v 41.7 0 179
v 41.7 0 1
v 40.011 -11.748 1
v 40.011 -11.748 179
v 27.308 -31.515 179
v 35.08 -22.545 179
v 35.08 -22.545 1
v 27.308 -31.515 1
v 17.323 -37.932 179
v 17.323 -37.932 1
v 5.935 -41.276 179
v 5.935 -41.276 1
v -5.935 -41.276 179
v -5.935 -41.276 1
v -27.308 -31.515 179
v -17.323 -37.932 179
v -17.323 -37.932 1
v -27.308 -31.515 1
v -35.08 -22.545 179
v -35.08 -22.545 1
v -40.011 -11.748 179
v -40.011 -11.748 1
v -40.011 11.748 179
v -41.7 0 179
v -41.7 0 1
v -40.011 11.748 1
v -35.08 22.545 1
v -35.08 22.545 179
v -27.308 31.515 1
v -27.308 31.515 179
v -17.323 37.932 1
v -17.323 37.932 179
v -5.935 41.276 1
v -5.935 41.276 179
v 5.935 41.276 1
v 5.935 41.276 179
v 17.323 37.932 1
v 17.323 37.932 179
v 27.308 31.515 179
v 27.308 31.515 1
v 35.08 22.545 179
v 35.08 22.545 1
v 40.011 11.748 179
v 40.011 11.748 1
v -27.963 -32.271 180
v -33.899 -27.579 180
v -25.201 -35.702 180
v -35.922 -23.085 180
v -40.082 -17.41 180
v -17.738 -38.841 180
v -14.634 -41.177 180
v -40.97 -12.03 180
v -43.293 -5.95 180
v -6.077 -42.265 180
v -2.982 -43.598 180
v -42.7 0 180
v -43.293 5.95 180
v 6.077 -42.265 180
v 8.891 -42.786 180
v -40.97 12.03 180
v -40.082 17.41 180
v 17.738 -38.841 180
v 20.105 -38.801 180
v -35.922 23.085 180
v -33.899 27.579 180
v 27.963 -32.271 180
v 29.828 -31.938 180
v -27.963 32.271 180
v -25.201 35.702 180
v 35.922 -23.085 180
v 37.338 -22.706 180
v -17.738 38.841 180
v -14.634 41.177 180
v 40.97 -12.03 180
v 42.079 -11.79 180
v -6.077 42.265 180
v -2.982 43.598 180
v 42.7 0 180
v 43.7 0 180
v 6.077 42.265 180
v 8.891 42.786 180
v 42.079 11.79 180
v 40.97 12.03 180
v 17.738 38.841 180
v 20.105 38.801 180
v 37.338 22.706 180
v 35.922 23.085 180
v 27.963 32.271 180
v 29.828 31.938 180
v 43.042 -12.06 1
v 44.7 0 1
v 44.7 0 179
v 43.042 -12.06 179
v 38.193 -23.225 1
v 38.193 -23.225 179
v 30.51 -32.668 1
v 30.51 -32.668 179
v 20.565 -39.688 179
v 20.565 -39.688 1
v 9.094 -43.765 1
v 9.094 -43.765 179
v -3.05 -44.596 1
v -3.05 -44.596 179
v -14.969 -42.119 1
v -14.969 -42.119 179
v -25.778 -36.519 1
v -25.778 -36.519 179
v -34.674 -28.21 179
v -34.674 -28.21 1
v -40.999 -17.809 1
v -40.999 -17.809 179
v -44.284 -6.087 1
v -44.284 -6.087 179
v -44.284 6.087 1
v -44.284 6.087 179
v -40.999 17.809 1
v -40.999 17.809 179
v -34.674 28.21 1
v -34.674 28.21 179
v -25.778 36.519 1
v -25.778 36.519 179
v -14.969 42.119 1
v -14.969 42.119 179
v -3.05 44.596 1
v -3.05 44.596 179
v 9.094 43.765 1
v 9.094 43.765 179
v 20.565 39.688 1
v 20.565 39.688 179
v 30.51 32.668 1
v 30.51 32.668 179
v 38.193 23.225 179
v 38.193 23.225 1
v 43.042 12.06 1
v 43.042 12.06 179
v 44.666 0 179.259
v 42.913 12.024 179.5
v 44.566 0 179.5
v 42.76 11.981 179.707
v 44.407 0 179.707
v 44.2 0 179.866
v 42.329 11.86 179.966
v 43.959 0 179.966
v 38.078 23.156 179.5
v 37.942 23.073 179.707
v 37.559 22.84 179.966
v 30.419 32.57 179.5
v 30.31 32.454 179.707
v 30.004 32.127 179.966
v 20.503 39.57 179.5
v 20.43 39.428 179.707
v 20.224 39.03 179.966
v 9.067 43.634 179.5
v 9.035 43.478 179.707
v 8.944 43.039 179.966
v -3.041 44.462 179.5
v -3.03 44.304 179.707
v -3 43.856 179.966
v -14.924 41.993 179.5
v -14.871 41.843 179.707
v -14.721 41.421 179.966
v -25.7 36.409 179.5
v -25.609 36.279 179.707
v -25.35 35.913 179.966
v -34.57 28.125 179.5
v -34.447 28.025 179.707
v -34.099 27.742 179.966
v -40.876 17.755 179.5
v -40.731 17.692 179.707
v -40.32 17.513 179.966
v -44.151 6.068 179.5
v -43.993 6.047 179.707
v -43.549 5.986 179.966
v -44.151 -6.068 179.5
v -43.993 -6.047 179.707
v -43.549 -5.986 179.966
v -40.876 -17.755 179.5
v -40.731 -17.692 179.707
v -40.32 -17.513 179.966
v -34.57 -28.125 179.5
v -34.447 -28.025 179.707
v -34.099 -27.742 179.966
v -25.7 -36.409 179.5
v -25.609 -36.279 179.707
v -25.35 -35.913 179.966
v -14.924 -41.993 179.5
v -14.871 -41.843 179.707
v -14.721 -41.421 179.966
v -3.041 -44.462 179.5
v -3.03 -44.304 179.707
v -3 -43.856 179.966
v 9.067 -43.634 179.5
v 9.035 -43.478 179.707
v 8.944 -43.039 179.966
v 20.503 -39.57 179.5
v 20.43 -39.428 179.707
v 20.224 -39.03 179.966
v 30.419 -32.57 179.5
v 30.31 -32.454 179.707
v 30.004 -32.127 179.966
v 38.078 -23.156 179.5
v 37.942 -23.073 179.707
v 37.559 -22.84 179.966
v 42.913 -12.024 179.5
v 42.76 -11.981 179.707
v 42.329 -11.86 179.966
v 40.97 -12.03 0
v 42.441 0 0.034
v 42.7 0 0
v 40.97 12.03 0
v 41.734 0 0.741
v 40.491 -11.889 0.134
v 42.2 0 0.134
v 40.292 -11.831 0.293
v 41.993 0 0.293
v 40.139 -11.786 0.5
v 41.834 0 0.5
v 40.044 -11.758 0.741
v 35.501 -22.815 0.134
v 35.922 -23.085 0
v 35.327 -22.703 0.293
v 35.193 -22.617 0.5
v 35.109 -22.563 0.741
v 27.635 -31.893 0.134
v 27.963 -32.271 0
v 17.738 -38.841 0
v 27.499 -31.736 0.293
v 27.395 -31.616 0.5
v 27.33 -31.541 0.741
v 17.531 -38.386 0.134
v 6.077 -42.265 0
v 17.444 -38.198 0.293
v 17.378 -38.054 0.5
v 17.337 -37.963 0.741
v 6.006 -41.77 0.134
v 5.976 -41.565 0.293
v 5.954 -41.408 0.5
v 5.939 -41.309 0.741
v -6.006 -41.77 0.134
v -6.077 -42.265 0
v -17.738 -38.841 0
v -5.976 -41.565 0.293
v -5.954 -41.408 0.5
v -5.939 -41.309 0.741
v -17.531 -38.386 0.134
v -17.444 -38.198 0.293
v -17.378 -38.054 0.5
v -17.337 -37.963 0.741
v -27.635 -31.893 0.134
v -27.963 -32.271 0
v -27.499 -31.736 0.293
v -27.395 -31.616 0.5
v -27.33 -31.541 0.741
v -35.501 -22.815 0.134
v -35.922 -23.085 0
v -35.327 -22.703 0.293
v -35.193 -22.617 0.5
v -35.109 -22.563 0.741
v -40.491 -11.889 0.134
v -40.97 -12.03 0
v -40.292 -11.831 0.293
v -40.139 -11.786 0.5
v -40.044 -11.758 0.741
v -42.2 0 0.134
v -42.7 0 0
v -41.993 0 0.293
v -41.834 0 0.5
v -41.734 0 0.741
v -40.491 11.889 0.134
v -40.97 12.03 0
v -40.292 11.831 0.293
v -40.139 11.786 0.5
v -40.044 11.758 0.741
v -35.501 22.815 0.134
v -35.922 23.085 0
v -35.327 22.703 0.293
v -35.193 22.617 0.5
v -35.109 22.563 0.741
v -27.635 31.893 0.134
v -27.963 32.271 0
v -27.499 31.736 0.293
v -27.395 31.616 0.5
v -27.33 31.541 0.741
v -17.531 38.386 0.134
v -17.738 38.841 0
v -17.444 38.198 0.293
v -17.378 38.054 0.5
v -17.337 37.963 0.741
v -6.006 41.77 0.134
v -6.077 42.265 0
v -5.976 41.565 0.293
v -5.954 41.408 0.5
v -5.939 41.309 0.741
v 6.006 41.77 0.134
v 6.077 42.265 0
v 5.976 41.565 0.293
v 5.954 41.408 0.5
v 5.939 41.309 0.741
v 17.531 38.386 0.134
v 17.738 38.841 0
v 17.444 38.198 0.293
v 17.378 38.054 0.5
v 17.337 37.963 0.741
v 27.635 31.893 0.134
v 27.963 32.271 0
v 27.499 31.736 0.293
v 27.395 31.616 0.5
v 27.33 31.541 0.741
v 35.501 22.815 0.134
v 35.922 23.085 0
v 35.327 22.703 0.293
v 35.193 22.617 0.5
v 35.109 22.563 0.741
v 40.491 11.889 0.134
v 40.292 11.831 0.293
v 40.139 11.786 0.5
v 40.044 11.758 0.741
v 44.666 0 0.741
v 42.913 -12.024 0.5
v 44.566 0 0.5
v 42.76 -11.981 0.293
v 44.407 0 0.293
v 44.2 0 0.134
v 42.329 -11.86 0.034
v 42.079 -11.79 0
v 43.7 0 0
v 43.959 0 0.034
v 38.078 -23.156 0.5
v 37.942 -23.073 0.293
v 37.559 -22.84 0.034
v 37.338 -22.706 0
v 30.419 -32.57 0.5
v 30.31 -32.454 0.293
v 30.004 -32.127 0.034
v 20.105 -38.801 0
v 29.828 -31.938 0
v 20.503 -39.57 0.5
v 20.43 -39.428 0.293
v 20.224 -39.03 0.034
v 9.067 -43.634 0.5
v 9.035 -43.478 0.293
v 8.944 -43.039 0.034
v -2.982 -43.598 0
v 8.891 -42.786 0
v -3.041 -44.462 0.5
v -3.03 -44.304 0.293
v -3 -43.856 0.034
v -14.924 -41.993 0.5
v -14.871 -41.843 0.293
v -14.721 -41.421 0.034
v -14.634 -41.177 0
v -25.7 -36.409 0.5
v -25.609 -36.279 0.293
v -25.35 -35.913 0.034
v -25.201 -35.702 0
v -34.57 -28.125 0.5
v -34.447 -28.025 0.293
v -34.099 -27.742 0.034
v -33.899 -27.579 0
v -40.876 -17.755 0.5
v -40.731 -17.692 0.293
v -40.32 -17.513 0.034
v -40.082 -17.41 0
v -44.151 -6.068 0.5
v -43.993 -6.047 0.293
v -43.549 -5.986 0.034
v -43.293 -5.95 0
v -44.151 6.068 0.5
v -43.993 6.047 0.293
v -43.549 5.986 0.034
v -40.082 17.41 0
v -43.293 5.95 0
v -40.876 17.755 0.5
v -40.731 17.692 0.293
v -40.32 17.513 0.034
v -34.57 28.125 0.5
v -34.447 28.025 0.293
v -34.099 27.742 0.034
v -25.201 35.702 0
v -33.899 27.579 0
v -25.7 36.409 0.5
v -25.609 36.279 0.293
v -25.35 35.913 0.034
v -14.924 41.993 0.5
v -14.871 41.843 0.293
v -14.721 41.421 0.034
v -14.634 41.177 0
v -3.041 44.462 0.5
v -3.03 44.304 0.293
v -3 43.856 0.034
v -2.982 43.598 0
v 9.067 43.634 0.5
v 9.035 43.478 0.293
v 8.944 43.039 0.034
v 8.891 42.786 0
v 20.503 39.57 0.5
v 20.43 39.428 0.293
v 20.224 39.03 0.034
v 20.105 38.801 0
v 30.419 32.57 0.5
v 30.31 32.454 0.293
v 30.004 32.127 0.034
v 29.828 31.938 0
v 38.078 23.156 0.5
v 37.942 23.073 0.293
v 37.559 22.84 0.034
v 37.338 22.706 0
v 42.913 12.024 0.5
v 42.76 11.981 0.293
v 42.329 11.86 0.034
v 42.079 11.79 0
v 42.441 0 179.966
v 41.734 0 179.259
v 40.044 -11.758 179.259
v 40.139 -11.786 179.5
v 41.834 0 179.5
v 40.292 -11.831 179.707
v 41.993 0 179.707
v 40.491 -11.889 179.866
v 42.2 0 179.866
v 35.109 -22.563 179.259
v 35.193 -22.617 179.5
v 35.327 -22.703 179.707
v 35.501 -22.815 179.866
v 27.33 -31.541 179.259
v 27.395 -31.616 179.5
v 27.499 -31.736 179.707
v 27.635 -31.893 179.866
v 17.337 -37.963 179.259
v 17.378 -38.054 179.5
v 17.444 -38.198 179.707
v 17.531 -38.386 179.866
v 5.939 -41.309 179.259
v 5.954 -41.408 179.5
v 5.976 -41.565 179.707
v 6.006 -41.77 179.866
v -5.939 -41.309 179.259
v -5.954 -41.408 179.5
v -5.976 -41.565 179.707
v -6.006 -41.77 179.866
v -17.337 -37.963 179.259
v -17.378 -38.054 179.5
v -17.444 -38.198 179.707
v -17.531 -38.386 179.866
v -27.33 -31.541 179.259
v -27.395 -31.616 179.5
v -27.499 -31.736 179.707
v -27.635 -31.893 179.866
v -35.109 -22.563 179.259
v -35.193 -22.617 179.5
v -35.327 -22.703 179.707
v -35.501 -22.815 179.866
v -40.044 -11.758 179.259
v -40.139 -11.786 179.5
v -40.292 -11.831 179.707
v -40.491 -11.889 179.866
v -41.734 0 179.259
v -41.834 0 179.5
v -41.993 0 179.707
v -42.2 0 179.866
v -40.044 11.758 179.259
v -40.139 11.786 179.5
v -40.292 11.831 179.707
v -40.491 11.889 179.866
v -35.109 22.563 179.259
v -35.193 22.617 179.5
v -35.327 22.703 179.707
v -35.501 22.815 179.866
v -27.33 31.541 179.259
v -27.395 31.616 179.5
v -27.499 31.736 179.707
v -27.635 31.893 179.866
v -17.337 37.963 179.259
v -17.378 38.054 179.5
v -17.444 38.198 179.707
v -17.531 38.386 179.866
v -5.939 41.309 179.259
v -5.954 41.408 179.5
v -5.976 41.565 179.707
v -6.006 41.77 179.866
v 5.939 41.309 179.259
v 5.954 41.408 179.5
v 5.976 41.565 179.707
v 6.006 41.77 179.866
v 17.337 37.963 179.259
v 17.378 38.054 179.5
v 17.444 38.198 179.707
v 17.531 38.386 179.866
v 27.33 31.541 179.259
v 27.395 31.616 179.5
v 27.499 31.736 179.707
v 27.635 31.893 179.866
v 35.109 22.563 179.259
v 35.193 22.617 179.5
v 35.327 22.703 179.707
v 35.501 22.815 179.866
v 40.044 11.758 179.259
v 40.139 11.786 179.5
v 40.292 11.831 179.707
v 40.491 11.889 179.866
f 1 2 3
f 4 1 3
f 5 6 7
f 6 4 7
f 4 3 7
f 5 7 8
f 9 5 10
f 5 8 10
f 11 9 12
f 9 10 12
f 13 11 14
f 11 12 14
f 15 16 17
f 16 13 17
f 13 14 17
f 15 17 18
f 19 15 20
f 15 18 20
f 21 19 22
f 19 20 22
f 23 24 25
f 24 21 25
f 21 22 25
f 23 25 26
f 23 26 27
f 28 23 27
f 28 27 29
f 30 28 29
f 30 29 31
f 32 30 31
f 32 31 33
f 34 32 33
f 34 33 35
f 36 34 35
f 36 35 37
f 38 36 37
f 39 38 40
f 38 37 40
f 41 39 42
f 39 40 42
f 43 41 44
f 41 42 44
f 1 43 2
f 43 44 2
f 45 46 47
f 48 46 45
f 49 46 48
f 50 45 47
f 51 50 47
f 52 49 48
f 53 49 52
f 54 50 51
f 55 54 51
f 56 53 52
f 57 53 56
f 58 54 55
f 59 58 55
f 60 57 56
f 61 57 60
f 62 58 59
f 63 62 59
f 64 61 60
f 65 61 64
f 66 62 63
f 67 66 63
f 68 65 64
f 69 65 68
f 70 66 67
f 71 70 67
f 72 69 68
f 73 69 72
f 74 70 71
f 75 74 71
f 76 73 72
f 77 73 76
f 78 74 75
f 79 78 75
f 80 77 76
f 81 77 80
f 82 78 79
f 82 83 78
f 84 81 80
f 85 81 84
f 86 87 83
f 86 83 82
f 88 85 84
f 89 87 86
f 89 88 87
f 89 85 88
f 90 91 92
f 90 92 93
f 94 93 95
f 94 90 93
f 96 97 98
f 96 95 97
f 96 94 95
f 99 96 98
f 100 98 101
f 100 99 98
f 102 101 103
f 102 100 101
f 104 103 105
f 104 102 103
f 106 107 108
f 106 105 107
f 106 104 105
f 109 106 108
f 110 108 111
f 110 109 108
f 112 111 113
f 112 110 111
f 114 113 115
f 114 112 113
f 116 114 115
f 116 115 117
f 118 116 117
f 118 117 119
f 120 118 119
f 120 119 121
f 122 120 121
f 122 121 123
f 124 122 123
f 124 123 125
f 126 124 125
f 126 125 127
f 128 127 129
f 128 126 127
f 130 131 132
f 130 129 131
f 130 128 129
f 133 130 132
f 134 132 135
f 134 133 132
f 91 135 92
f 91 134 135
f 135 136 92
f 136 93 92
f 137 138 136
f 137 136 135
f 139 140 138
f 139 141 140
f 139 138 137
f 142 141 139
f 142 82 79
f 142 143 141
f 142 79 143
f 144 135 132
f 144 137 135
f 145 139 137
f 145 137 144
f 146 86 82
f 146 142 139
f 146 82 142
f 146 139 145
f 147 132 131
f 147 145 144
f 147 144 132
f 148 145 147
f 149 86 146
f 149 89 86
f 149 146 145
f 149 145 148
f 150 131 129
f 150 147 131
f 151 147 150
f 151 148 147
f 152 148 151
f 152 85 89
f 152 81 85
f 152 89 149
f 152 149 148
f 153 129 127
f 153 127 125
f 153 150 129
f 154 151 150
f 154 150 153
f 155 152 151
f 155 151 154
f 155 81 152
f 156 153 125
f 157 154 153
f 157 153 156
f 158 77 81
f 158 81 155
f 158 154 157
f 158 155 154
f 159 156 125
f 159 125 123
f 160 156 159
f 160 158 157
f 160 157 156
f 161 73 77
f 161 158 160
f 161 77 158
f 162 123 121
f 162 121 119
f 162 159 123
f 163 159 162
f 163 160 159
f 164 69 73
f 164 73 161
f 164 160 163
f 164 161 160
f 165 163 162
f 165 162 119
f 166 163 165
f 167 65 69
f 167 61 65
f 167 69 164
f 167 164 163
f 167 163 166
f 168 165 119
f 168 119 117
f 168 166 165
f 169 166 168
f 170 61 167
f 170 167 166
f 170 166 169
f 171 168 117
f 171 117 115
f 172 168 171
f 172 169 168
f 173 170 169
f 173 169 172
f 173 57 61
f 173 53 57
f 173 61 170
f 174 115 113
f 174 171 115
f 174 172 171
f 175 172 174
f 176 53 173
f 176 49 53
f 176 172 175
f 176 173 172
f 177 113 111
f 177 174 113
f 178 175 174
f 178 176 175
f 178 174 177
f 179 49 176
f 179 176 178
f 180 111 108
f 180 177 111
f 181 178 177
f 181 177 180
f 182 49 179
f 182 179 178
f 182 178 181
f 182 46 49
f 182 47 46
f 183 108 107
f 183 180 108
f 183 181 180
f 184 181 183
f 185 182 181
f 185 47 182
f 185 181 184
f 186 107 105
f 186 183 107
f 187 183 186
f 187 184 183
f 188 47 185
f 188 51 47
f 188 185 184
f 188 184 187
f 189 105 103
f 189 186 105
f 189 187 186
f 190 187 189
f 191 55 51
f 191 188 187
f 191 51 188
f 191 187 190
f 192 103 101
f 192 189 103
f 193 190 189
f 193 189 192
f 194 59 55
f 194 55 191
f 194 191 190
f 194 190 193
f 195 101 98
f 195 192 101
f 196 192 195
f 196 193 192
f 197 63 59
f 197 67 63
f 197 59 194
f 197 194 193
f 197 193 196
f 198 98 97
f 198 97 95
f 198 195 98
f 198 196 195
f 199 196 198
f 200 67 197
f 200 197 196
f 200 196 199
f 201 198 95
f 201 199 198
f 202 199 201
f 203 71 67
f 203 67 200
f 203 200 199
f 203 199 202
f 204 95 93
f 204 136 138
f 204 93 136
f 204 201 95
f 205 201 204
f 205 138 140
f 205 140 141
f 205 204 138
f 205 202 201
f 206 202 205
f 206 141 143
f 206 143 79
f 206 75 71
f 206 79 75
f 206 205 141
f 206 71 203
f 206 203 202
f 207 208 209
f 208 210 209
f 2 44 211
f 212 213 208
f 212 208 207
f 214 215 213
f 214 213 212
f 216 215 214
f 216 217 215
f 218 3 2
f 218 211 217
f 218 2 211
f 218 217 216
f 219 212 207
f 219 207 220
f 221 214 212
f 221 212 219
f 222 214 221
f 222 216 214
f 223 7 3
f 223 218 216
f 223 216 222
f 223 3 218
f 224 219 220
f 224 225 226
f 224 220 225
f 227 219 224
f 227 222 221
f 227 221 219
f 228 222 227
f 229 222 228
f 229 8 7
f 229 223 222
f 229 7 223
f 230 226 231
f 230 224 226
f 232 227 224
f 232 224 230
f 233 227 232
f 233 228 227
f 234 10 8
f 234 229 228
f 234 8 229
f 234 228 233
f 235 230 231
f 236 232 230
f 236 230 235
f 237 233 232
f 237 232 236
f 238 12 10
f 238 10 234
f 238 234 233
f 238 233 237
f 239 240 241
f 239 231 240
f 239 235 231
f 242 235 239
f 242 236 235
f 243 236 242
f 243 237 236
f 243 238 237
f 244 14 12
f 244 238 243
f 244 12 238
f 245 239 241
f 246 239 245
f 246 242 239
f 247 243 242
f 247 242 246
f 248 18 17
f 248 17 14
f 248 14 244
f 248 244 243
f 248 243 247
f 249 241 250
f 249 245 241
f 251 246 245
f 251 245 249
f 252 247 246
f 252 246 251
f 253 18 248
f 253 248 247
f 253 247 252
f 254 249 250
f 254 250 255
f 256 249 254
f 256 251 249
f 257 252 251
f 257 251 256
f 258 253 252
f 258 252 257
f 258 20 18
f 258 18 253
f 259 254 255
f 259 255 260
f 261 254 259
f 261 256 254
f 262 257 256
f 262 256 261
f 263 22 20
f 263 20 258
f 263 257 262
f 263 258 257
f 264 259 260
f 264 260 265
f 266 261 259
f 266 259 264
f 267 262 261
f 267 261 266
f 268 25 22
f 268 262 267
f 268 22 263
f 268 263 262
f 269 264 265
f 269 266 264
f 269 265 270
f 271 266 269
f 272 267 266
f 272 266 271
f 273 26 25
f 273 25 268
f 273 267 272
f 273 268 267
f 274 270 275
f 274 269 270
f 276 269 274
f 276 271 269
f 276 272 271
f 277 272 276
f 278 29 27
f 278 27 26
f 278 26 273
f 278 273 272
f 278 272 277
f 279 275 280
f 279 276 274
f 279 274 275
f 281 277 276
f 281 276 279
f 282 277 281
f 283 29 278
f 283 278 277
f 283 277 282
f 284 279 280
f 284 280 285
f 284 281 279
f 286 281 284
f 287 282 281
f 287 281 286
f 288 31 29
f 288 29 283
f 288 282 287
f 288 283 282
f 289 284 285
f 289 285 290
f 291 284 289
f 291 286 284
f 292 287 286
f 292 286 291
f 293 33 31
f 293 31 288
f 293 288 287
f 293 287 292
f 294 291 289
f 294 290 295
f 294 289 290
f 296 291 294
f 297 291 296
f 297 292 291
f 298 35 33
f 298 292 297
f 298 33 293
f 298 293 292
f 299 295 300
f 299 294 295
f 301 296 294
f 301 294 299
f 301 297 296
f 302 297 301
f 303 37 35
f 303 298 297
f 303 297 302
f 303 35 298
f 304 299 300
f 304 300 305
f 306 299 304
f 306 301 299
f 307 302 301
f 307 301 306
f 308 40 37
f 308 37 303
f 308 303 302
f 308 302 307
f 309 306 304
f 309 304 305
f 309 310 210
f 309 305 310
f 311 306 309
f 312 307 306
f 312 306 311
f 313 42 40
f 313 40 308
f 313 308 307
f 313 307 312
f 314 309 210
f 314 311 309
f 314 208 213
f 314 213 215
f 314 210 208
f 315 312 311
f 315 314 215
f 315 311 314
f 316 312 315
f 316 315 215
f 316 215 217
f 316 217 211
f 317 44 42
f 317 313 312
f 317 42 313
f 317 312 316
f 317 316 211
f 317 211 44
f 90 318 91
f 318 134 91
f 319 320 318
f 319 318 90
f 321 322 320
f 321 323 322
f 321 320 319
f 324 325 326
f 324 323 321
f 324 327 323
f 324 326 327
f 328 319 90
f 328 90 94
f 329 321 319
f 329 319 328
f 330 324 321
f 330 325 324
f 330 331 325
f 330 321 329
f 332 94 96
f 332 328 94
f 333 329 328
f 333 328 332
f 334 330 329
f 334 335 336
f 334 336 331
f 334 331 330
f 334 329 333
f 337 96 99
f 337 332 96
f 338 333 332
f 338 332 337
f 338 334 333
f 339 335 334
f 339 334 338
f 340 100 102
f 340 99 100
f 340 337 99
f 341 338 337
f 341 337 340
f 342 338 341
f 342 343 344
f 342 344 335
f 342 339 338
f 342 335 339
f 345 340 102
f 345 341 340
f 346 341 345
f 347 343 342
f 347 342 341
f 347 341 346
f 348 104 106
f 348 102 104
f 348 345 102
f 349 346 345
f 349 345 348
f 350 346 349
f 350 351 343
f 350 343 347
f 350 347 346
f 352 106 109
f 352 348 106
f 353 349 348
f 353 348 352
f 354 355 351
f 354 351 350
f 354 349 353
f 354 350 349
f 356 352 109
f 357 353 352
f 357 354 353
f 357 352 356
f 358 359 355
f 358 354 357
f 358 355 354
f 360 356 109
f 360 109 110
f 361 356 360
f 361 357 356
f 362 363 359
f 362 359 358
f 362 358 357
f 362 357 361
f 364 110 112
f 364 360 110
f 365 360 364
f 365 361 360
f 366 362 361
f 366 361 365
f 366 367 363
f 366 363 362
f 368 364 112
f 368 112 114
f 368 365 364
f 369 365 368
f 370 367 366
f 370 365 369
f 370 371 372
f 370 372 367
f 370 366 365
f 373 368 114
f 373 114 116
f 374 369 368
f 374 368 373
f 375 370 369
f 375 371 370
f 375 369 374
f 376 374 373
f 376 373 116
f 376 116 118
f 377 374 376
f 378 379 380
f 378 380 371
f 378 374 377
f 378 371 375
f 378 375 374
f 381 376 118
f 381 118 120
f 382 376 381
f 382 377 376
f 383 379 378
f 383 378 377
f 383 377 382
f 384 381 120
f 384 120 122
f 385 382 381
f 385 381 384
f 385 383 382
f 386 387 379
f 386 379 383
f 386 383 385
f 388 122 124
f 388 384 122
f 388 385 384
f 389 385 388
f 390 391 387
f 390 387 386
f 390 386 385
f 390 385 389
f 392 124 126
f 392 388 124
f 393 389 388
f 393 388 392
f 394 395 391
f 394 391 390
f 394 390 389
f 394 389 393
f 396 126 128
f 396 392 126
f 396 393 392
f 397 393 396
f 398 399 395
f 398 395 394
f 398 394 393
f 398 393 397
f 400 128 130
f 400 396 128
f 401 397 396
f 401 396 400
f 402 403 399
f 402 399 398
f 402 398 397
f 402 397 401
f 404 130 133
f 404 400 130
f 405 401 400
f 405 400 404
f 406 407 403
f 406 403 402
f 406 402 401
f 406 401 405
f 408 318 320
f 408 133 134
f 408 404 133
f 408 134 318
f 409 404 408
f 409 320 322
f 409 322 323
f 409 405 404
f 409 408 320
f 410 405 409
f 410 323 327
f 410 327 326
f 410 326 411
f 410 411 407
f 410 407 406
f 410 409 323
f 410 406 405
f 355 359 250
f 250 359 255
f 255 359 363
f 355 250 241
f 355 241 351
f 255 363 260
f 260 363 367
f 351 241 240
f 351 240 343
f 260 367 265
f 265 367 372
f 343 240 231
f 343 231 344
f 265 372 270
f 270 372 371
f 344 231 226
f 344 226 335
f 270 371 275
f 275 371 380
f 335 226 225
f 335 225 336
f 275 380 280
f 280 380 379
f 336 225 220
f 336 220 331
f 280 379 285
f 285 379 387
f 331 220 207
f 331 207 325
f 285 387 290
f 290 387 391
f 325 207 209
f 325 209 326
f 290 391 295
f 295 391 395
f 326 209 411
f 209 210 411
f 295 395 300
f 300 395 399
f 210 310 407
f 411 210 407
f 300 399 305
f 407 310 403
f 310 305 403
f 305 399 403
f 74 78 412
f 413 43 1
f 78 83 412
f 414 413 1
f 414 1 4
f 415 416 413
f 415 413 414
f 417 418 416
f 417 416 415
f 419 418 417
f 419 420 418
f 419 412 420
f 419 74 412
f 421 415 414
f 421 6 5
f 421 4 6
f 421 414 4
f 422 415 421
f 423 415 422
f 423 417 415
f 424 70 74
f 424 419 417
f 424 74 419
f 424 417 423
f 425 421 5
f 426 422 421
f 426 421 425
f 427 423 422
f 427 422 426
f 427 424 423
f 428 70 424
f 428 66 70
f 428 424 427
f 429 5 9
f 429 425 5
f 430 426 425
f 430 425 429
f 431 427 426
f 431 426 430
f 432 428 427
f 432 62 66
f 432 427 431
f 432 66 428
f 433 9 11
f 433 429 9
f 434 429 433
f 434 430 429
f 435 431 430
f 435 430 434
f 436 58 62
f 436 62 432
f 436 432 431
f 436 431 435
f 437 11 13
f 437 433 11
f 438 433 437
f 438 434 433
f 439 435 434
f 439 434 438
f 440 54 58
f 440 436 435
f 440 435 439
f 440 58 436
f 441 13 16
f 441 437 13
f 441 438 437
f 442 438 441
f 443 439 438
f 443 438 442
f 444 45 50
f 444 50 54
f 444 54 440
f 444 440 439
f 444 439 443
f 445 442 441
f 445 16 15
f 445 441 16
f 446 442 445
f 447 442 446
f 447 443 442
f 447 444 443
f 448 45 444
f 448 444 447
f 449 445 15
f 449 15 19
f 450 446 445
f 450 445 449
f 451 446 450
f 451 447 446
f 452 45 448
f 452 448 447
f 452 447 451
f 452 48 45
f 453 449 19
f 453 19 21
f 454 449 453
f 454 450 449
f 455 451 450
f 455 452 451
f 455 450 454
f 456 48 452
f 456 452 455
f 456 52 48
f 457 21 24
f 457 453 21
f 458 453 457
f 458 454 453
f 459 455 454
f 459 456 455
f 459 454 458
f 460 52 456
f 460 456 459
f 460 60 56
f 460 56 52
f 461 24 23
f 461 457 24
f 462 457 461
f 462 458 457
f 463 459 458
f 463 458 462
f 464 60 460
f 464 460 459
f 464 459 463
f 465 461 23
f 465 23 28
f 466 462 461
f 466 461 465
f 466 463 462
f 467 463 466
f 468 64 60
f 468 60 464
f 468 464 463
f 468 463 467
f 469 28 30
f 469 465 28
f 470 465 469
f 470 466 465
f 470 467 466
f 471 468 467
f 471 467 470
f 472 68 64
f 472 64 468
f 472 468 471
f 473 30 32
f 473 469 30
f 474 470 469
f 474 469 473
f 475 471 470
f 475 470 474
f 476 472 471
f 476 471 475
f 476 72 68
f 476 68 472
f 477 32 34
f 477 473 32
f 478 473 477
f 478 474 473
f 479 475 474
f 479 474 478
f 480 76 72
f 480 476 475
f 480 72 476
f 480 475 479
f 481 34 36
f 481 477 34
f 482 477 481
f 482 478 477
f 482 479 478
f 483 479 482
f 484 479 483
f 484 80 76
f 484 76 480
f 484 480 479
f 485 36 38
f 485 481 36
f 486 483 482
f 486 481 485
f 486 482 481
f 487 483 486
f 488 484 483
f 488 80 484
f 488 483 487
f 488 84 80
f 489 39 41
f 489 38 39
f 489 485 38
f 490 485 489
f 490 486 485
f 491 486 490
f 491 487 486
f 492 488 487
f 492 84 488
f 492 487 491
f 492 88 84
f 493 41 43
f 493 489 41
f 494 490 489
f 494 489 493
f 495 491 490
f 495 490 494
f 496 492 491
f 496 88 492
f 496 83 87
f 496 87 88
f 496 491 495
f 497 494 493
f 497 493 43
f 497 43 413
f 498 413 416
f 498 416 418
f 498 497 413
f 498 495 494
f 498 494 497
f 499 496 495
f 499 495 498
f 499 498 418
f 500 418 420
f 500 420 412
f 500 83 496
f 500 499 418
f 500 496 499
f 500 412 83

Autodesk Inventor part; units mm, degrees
ref_plane "YZ Plane" through (0, 0, 0) normal (1, 0, 0) x (0, 1, 0)
ref_plane "XZ Plane" through (0, 0, 0) normal (0, 1, 0) x (-1, 0, 0)
ref_plane "XY Plane" through (0, 0, 0) normal (0, 0, 1) x (1, 0, 0)
sketch "Sketch1" plane through (0, 0, 0) normal (0, 0, 1) x (1, 0, 0)
  circle A0 centre (0, 0) radius 44.7
  circle A1 centre (0, 0) radius 41.7
  dimension "d0" = 89.4
  dimension "d1" = 83.4
extrude "Extrusion1" add sketch "Sketch1" along normal blind 180
thread "Thread1" size "M16x2" class "6g" standard "ANSI Metric M Profile" full length
fillet "Fillet1" radius 1 2 edges at (-44.7, 0, 180) (-41.7, 0, 180)
fillet "Fillet2" radius 1 2 edges at (-41.7, 0, 0) (-44.7, 0, 0)
properties part number "4111_Bias_Coil_Layer4_MPSv2_v2" material "Copper"
